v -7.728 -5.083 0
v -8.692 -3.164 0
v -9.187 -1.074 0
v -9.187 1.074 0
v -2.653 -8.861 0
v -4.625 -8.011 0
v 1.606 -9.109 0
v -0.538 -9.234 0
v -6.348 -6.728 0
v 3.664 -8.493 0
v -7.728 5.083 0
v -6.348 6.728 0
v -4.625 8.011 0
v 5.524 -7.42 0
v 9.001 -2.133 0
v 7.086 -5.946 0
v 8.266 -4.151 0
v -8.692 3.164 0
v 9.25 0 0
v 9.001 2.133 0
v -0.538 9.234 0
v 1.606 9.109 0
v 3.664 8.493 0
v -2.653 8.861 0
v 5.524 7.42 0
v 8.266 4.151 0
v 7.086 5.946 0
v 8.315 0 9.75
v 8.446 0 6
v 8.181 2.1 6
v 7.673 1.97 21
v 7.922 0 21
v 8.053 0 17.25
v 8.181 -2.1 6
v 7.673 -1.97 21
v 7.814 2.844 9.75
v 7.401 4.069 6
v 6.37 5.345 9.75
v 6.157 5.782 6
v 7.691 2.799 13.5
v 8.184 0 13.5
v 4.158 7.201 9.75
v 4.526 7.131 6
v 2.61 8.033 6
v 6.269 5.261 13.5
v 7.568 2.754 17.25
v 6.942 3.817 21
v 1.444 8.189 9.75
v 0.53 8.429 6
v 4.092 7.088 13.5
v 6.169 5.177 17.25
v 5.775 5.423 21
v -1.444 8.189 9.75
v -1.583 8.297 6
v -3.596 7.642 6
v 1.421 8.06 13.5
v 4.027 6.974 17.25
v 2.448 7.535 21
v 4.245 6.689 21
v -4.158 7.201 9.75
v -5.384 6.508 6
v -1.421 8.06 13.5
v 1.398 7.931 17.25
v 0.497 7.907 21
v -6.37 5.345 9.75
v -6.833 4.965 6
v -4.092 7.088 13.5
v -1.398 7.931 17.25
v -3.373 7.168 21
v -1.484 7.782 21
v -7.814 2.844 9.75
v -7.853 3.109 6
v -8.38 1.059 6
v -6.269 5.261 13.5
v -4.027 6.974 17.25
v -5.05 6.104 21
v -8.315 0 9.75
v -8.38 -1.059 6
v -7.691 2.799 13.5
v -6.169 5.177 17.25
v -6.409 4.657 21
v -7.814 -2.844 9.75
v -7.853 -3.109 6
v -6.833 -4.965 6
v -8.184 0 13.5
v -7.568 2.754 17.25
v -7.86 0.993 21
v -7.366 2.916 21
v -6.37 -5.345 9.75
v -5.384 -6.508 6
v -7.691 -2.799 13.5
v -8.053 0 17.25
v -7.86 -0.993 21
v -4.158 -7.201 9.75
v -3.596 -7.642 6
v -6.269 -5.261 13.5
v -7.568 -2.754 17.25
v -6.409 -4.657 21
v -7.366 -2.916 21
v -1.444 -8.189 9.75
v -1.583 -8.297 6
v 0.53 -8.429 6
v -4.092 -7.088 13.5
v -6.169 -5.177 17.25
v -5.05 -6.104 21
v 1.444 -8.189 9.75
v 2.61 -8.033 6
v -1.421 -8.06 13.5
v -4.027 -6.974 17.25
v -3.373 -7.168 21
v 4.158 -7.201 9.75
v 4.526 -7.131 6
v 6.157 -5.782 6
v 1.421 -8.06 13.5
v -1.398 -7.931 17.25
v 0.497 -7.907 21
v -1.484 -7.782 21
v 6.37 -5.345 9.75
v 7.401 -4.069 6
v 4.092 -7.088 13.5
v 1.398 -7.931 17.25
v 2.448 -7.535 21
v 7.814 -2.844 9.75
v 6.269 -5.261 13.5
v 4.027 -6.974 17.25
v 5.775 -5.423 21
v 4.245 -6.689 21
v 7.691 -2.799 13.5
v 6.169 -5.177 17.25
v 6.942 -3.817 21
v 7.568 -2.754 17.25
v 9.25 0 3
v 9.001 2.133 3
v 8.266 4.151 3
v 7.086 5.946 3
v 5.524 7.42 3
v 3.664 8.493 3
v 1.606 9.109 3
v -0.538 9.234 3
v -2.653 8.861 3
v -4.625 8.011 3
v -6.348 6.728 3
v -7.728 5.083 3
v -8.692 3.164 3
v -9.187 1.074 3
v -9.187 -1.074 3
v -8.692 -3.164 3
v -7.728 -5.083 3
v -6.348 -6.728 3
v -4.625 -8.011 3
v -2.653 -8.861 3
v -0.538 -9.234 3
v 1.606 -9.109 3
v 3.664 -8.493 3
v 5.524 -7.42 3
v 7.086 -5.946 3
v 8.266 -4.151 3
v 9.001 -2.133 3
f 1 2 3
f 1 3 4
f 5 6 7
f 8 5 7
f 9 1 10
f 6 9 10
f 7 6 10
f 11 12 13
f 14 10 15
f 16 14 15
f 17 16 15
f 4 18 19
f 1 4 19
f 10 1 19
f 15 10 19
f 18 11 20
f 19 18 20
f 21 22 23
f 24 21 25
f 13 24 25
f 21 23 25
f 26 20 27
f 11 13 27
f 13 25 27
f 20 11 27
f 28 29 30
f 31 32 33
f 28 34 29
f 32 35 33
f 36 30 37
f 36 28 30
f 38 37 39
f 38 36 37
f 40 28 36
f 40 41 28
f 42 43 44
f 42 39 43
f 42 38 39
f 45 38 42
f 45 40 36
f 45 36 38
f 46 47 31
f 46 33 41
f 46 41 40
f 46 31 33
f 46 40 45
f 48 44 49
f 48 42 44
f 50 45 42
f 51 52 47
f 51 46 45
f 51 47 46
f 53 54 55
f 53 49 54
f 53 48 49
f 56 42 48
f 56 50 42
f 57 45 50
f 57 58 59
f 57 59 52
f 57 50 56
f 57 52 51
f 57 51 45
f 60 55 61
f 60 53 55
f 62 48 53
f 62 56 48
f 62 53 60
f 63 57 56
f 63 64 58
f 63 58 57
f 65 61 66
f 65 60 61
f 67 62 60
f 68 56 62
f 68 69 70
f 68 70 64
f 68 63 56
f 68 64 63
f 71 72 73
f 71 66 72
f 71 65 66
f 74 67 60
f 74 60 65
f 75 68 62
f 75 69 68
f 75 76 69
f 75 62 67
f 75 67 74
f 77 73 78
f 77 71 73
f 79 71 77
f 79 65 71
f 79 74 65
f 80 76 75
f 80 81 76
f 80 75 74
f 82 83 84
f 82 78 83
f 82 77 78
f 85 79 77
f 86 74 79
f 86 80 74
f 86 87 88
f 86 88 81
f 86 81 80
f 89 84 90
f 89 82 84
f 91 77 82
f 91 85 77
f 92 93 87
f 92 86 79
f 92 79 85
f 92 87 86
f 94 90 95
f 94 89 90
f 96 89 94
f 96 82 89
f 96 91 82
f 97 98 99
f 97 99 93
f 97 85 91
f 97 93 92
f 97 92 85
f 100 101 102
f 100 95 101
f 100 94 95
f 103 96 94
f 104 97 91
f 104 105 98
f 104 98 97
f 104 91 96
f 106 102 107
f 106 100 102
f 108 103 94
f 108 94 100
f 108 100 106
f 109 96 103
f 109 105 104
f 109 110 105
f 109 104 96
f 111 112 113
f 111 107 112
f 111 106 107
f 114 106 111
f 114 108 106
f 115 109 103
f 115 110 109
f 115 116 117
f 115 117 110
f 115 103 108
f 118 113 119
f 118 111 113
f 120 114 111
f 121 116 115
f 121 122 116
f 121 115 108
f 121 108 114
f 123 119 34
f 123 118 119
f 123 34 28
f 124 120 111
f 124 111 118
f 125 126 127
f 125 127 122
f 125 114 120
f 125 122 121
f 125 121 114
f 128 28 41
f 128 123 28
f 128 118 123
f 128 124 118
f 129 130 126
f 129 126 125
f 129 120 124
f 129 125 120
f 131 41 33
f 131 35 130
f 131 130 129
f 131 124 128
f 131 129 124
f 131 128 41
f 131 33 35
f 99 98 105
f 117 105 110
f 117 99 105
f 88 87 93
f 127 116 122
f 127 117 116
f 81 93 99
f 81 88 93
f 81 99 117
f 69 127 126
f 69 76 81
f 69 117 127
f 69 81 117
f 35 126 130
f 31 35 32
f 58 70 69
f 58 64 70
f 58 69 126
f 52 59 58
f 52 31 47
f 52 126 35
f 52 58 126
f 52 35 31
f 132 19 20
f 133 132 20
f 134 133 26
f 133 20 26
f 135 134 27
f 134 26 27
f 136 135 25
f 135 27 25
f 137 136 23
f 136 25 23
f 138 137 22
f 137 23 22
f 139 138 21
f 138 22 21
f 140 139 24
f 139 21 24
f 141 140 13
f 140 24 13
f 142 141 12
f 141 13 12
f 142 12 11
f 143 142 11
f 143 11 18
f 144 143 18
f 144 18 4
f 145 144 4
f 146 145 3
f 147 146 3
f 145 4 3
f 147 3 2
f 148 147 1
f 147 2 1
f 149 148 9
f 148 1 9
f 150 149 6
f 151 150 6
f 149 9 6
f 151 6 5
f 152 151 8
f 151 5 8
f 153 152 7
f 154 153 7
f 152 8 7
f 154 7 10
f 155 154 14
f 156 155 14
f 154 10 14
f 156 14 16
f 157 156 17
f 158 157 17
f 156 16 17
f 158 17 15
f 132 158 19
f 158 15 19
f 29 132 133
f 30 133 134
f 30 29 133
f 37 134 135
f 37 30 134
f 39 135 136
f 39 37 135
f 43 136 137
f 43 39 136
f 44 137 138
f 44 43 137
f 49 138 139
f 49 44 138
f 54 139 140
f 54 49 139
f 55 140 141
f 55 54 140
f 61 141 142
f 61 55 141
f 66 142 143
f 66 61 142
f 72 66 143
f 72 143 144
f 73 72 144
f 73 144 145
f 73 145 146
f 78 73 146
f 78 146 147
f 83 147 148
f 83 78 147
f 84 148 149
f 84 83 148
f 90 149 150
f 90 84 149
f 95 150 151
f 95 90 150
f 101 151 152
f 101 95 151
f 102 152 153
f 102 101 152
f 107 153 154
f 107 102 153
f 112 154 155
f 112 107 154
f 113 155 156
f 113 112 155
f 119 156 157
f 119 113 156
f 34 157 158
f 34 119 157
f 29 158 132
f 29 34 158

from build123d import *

# Parameters (mm, degrees)
F0_R      = 9.25
F1_DEPTH  = 3
F1_FACE_R = 9.25
F2_DEPTH  = 3
F2_TAPER  = 15
F2_FACE_R = 8.4461524227
F3_DEPTH  = 15
F3_TAPER  = 2


with BuildPart() as f1:
    # F0 (on Top) → F1 (new body)
    with BuildSketch(Plane.XY):
        Circle(F0_R)
    extrude(amount=F1_DEPTH)

    # F1_face (on face) → F2 (join)
    with BuildSketch(Plane.XY.offset(3)):
        Circle(F1_FACE_R)
    extrude(amount=F2_DEPTH, taper=F2_TAPER)

    # F2_face (on face) → F3 (join)
    with BuildSketch(Plane.XY.offset(6)):
        Circle(F2_FACE_R)
    extrude(amount=F3_DEPTH, taper=F3_TAPER)


solid = f1.part
